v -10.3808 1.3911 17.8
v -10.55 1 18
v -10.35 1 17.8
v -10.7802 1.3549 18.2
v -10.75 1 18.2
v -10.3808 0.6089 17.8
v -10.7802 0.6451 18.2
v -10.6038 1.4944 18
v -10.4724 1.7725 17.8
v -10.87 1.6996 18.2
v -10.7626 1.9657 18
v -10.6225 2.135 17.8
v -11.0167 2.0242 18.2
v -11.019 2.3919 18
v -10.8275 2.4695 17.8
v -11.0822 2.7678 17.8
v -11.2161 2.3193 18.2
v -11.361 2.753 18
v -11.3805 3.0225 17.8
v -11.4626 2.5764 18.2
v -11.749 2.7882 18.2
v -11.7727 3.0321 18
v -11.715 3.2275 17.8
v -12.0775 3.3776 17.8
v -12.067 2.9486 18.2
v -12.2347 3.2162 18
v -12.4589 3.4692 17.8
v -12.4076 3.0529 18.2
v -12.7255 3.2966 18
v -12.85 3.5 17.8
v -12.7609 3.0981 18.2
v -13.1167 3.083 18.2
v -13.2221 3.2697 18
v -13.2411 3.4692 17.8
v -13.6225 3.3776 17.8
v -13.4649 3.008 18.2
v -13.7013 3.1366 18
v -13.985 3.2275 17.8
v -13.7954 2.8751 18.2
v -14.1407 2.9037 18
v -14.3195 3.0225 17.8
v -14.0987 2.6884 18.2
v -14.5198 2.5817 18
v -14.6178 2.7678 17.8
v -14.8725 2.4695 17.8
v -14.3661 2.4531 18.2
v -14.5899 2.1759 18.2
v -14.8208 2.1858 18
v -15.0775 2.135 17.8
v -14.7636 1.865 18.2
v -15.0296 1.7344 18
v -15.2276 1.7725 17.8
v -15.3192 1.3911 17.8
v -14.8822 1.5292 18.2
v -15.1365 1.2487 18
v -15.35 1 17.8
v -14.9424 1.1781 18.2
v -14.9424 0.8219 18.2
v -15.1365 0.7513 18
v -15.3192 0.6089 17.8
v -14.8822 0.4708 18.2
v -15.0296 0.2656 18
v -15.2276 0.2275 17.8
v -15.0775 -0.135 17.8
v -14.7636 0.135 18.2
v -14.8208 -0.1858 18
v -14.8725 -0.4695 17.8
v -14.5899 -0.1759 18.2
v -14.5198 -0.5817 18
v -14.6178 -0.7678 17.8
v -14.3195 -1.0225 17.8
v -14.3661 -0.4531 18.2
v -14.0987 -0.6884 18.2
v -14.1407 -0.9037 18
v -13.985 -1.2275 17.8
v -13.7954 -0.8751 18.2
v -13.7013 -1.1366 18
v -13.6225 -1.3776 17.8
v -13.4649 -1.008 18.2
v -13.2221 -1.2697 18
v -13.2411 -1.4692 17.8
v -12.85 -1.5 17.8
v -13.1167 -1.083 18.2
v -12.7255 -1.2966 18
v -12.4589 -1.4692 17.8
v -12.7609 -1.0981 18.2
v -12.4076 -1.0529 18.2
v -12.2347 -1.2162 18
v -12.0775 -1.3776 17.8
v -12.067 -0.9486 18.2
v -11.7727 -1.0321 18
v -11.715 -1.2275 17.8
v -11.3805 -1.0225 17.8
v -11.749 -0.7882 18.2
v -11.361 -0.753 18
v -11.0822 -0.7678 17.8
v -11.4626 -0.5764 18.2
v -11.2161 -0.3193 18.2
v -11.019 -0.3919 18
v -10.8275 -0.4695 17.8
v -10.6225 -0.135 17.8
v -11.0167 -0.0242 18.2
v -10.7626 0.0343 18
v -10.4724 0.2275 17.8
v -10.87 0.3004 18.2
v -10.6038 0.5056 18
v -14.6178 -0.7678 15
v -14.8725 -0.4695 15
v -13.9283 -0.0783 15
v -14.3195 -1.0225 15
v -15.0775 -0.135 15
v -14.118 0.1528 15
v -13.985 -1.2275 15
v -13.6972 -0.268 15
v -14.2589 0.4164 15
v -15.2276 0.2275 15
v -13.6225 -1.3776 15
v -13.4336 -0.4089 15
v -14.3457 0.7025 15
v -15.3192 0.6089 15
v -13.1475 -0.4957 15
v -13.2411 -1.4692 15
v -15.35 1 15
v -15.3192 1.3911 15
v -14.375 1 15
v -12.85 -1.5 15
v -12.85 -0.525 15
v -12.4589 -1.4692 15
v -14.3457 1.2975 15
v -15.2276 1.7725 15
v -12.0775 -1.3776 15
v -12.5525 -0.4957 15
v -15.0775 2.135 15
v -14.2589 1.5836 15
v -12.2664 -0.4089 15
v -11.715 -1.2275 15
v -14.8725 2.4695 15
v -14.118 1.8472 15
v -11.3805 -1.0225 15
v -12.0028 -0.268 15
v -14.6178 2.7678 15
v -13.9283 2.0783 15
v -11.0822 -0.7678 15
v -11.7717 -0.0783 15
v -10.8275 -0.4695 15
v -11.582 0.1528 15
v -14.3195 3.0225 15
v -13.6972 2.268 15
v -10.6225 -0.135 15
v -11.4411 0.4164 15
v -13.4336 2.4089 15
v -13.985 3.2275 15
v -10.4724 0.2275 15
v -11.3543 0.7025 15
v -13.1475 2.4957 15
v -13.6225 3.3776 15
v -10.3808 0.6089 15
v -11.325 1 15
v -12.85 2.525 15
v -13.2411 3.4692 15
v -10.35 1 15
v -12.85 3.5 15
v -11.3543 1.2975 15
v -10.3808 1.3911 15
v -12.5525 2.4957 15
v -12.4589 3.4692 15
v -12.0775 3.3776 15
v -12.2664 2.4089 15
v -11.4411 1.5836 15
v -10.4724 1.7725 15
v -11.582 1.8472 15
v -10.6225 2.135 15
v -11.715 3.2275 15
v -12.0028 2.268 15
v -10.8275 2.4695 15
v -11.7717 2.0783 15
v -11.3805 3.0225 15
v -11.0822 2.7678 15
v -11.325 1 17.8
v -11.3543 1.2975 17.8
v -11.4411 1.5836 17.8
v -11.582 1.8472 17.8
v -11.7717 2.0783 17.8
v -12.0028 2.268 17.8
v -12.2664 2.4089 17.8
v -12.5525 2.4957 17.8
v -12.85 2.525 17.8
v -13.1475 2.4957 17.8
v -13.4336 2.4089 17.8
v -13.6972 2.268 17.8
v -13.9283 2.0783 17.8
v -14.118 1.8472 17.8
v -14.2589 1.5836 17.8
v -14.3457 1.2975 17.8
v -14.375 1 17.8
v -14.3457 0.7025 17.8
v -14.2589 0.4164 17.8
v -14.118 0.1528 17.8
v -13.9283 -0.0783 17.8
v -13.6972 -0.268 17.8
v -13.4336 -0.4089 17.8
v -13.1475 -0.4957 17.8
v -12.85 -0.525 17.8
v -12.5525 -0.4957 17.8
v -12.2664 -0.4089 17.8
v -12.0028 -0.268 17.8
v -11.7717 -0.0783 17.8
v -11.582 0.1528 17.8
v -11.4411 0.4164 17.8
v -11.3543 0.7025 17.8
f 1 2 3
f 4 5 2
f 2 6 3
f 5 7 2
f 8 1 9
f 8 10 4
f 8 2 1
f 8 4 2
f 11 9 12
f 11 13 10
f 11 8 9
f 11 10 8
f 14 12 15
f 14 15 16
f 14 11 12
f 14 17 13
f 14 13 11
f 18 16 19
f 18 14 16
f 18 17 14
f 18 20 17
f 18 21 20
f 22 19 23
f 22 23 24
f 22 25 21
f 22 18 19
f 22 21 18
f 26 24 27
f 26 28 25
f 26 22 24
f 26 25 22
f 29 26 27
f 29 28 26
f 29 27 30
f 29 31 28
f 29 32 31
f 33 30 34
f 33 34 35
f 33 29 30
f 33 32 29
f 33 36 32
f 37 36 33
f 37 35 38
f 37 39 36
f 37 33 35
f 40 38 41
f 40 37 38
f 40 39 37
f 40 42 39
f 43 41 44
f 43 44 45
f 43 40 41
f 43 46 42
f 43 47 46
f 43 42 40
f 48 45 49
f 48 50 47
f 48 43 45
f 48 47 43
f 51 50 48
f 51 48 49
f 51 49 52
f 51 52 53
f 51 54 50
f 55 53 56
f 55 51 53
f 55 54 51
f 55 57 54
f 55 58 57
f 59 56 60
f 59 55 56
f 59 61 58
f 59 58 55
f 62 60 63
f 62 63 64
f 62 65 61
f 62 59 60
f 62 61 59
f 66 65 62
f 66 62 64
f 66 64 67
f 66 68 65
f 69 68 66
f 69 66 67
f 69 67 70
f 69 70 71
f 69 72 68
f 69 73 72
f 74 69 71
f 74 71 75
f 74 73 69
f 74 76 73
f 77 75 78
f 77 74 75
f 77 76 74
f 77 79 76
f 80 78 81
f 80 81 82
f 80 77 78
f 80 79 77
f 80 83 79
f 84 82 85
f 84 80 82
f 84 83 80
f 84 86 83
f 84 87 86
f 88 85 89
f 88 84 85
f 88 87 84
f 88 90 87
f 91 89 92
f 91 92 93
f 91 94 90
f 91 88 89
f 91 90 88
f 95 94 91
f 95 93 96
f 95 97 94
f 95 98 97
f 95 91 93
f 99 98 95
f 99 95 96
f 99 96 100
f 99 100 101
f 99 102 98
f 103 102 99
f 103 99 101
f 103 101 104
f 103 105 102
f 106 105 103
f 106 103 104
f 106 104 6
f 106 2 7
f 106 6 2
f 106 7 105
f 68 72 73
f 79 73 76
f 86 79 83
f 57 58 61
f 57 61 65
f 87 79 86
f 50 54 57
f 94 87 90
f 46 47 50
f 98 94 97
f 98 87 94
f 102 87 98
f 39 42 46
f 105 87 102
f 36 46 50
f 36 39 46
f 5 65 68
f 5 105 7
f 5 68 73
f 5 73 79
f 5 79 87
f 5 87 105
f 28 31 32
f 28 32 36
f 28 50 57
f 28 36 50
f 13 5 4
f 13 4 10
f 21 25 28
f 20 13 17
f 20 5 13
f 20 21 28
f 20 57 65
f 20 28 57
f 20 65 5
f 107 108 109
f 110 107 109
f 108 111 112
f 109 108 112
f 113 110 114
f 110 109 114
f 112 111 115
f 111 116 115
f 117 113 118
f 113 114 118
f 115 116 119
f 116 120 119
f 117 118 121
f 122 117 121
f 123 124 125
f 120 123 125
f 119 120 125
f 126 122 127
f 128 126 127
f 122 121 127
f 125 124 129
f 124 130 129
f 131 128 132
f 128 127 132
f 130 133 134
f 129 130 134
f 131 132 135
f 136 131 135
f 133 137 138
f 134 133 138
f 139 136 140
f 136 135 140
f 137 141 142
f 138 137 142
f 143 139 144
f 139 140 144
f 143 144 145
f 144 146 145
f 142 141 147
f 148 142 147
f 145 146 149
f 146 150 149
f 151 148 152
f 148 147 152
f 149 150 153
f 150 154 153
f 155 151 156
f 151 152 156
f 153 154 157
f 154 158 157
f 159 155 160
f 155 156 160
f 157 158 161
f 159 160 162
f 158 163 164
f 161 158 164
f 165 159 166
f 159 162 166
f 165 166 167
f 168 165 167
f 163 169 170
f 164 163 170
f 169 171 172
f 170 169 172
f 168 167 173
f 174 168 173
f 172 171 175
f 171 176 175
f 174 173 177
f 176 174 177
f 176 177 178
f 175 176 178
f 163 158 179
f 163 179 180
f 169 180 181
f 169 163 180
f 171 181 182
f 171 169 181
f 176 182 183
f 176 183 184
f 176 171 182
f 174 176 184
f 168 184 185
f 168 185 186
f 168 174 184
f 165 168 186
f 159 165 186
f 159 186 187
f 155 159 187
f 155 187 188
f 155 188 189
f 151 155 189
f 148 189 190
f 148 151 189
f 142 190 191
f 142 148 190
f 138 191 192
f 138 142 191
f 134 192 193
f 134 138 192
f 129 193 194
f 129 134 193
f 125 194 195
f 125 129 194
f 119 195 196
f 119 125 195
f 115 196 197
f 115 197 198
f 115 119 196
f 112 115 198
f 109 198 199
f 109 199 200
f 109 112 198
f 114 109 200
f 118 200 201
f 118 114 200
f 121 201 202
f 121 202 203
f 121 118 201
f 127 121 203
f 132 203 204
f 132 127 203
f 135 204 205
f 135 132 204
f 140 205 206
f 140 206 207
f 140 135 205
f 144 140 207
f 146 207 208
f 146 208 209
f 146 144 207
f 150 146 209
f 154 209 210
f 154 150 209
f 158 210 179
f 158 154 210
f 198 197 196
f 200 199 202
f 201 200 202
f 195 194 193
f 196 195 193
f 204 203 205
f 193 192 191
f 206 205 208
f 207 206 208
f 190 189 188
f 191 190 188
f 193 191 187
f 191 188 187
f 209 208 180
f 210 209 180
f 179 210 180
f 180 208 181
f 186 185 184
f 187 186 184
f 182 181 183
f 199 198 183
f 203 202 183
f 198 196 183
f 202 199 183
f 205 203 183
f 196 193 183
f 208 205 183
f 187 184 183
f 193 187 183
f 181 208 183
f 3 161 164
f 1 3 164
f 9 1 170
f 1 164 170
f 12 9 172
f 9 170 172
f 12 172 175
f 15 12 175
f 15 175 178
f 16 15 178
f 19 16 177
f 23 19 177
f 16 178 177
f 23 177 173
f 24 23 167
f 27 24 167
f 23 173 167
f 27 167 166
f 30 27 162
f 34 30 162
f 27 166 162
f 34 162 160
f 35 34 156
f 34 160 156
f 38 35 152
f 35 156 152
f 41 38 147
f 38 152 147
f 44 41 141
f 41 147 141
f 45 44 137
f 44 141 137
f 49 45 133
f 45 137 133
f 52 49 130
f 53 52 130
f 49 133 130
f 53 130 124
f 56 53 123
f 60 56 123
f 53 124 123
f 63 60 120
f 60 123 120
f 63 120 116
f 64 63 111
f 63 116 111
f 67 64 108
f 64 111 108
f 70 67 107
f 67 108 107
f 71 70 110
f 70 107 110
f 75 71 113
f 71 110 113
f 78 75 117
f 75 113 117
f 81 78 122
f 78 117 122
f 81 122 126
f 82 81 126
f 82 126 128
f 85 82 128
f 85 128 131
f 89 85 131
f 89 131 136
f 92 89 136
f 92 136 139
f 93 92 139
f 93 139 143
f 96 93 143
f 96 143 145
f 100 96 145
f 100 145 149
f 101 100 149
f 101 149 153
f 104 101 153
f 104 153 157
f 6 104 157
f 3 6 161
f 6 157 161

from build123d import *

# Parameters (mm, degrees)
SKETCH023_R     = 2.5
PAD016_DEPTH    = 3.2
SKETCH024_R     = 1.525
POCKET005_DEPTH = 2.8
CHAMFER003_SIZE = 0.4


with BuildPart() as part:
    # Sketch023 → Pad016 (new body)
    with BuildSketch(Plane.XY):
        with Locations((-12.85, 1)):
            Circle(SKETCH023_R)
    extrude(amount=PAD016_DEPTH)

    # Sketch024 → Pocket005 (cut)
    with BuildSketch(Plane.XY):
        with Locations((-12.85, 1)):
            Circle(SKETCH024_R)
    extrude(amount=POCKET005_DEPTH, mode=Mode.SUBTRACT)

    # Chamfer003
    chamfer003_edges = [part.edges().sort_by_distance(p)[0] for p in [
        (-15.35, 1, 3.2),
    ]]
    chamfer(chamfer003_edges, length=CHAMFER003_SIZE)


with BuildPart() as part_1:
    # Body006 placement: moved
    add(part.part.moved(Location((0, 0, 15))))


solid = part_1.part
